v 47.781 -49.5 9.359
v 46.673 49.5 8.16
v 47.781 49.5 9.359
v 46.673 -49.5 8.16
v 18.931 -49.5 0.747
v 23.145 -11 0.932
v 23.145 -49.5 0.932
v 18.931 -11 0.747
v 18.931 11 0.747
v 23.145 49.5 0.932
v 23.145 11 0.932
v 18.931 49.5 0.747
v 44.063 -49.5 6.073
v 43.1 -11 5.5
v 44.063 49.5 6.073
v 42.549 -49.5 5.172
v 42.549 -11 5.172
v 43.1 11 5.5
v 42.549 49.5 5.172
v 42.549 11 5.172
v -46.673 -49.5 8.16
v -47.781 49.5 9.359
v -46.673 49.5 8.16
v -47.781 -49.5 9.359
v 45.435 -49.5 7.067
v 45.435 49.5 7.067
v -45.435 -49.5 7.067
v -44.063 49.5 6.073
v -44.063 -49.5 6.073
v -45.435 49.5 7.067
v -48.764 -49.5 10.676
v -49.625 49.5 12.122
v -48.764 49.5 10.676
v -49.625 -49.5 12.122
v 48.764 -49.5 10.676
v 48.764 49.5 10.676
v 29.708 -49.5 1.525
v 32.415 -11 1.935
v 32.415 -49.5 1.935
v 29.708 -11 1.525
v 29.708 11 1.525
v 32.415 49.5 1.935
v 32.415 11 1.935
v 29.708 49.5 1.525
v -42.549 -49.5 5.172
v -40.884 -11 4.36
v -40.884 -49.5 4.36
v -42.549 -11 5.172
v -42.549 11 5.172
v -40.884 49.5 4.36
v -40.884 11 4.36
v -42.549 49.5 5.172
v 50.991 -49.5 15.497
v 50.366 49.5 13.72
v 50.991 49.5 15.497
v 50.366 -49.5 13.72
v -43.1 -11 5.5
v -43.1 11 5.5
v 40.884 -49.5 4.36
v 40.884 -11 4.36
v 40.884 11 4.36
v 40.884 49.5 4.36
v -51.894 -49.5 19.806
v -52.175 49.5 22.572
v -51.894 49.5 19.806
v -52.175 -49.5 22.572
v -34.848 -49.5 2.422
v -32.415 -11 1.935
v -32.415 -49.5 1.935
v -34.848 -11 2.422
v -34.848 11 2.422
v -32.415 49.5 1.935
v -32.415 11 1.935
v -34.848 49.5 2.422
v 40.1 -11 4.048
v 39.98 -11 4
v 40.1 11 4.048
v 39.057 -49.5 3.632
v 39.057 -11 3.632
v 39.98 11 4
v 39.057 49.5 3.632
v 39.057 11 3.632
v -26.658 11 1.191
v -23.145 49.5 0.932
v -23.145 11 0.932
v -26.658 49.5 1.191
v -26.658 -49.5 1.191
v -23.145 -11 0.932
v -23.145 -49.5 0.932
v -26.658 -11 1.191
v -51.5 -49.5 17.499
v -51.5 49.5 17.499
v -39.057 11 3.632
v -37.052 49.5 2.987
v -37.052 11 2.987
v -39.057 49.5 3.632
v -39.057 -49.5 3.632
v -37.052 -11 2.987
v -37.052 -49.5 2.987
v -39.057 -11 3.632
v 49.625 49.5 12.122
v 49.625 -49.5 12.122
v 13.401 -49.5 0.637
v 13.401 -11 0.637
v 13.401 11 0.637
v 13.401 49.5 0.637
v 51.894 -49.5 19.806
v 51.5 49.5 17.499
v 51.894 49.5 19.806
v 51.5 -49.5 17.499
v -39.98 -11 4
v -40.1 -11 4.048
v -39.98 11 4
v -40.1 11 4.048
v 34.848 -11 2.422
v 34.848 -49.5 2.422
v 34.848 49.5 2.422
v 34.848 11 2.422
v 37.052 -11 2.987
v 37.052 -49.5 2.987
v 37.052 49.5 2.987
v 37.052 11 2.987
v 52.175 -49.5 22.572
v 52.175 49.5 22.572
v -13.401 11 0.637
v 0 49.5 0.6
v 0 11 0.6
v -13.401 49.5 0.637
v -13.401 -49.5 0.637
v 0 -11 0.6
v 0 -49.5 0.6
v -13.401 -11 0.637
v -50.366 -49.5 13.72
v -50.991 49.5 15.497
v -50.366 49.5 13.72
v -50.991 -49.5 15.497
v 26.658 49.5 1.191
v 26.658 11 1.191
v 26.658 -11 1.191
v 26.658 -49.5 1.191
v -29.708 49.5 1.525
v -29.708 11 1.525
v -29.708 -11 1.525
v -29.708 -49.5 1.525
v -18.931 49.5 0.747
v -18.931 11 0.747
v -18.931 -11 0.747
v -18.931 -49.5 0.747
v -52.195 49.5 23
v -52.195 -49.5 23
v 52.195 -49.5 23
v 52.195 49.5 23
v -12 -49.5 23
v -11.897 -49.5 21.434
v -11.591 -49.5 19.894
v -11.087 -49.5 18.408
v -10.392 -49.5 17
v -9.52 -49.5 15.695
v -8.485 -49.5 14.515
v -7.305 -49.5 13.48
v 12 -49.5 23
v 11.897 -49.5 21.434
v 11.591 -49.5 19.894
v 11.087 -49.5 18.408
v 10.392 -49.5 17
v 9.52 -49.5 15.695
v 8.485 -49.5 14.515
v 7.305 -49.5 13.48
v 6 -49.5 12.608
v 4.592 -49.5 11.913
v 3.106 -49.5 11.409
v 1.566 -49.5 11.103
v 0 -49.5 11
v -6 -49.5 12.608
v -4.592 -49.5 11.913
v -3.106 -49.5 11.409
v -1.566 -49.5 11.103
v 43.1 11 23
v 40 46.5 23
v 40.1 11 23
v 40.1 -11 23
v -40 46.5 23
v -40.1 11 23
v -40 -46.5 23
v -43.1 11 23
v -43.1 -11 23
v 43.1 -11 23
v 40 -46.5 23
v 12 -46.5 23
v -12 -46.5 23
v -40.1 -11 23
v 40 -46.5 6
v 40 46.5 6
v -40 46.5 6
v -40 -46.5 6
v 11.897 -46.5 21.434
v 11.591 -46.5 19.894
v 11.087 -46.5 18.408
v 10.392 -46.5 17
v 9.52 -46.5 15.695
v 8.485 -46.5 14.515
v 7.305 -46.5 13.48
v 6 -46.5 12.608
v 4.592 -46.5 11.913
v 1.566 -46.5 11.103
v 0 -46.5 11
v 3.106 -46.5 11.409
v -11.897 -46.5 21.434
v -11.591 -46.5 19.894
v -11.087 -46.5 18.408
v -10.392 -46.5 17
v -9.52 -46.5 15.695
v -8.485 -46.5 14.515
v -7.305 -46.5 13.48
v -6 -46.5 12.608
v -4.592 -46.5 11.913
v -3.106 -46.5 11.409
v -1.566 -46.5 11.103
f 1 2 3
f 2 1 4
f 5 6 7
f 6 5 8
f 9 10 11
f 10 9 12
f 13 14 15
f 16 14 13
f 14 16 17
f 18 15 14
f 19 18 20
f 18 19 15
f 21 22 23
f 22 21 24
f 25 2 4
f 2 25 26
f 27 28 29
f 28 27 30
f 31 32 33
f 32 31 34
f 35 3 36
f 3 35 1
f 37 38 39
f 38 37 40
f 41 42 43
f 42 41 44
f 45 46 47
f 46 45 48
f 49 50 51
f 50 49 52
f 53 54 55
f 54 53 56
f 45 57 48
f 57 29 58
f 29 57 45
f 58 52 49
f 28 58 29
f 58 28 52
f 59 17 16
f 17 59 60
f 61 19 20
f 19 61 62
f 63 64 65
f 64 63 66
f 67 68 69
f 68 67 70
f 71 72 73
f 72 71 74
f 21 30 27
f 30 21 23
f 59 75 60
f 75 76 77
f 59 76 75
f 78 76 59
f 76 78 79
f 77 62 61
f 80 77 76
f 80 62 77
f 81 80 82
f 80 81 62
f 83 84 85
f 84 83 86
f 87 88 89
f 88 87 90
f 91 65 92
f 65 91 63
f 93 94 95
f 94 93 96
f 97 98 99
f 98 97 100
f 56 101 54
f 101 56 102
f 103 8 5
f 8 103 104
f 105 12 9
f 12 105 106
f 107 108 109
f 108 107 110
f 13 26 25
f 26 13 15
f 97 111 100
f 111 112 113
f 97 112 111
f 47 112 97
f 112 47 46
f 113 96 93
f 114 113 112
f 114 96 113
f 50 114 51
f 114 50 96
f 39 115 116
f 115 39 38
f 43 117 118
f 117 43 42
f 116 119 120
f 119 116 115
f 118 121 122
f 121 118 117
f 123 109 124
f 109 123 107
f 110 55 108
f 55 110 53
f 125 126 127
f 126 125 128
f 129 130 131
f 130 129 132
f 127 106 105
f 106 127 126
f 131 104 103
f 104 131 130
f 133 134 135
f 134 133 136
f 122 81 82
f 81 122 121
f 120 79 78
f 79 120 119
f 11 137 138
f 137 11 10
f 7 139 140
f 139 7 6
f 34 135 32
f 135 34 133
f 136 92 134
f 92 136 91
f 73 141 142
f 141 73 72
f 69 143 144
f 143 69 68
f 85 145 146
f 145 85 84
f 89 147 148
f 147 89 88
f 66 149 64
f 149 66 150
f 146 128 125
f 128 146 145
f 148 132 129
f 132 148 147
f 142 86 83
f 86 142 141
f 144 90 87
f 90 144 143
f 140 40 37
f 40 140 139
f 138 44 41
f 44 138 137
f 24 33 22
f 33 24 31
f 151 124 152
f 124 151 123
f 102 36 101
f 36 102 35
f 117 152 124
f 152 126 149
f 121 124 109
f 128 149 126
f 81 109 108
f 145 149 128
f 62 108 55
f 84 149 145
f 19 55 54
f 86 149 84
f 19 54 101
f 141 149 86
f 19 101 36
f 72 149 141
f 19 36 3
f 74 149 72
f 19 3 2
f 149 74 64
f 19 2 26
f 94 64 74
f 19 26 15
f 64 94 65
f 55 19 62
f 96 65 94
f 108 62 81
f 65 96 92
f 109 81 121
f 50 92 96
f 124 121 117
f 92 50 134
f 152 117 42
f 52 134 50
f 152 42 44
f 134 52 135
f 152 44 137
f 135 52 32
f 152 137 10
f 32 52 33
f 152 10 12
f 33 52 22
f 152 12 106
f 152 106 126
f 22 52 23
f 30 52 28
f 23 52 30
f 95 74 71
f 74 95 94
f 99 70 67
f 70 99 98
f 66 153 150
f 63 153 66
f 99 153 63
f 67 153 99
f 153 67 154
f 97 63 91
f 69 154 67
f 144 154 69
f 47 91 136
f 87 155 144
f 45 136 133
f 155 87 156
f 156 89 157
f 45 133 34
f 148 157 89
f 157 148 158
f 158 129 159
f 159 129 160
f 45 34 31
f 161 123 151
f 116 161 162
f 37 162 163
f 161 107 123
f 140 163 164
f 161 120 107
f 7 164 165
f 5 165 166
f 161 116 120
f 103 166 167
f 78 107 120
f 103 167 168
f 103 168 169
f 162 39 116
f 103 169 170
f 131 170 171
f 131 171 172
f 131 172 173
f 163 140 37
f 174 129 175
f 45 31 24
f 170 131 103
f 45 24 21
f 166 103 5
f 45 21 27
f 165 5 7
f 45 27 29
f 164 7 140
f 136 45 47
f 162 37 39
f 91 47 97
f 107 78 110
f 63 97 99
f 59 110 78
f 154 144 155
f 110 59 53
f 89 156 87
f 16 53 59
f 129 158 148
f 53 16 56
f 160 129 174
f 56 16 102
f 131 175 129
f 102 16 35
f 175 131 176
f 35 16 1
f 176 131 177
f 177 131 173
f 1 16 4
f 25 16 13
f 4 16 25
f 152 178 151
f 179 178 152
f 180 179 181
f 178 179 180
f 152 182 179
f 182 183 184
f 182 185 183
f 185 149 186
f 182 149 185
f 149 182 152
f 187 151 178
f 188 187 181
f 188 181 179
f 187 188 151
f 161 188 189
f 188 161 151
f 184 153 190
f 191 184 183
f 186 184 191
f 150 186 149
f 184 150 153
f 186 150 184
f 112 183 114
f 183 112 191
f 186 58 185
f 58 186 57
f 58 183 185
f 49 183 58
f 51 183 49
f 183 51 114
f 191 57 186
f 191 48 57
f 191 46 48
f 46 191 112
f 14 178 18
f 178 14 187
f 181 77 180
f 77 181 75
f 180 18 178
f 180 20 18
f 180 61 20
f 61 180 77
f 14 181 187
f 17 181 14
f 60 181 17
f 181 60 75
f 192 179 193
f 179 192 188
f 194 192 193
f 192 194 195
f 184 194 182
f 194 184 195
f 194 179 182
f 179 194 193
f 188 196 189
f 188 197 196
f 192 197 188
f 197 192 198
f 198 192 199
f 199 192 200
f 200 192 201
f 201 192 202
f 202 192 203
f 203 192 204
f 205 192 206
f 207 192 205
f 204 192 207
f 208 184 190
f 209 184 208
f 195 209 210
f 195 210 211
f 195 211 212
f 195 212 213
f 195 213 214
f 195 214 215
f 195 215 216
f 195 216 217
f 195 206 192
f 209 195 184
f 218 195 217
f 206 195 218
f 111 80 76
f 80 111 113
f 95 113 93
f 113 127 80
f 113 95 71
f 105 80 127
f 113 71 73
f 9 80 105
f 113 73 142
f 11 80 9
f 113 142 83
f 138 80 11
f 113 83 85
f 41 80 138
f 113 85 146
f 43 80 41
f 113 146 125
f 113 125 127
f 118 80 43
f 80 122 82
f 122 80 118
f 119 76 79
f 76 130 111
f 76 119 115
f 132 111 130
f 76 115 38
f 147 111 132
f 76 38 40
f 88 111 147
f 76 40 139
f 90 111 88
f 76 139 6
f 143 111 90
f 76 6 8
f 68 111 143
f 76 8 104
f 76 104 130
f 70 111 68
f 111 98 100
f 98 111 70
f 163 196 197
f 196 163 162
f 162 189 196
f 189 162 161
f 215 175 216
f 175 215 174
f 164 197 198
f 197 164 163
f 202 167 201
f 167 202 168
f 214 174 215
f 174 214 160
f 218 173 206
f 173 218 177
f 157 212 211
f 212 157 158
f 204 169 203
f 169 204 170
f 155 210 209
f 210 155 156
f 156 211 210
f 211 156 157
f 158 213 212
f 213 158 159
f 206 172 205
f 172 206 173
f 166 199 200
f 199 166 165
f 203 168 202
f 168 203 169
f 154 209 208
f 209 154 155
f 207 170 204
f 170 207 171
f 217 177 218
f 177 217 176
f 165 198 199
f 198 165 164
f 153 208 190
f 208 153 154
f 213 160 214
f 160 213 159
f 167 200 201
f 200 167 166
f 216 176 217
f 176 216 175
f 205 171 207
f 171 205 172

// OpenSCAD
// Battery cradle for the cool pod. Loose; lifts out with the bank.
include <bino.scad>
translate([0, -bank_yc, pod_b - wall]) cradle();
